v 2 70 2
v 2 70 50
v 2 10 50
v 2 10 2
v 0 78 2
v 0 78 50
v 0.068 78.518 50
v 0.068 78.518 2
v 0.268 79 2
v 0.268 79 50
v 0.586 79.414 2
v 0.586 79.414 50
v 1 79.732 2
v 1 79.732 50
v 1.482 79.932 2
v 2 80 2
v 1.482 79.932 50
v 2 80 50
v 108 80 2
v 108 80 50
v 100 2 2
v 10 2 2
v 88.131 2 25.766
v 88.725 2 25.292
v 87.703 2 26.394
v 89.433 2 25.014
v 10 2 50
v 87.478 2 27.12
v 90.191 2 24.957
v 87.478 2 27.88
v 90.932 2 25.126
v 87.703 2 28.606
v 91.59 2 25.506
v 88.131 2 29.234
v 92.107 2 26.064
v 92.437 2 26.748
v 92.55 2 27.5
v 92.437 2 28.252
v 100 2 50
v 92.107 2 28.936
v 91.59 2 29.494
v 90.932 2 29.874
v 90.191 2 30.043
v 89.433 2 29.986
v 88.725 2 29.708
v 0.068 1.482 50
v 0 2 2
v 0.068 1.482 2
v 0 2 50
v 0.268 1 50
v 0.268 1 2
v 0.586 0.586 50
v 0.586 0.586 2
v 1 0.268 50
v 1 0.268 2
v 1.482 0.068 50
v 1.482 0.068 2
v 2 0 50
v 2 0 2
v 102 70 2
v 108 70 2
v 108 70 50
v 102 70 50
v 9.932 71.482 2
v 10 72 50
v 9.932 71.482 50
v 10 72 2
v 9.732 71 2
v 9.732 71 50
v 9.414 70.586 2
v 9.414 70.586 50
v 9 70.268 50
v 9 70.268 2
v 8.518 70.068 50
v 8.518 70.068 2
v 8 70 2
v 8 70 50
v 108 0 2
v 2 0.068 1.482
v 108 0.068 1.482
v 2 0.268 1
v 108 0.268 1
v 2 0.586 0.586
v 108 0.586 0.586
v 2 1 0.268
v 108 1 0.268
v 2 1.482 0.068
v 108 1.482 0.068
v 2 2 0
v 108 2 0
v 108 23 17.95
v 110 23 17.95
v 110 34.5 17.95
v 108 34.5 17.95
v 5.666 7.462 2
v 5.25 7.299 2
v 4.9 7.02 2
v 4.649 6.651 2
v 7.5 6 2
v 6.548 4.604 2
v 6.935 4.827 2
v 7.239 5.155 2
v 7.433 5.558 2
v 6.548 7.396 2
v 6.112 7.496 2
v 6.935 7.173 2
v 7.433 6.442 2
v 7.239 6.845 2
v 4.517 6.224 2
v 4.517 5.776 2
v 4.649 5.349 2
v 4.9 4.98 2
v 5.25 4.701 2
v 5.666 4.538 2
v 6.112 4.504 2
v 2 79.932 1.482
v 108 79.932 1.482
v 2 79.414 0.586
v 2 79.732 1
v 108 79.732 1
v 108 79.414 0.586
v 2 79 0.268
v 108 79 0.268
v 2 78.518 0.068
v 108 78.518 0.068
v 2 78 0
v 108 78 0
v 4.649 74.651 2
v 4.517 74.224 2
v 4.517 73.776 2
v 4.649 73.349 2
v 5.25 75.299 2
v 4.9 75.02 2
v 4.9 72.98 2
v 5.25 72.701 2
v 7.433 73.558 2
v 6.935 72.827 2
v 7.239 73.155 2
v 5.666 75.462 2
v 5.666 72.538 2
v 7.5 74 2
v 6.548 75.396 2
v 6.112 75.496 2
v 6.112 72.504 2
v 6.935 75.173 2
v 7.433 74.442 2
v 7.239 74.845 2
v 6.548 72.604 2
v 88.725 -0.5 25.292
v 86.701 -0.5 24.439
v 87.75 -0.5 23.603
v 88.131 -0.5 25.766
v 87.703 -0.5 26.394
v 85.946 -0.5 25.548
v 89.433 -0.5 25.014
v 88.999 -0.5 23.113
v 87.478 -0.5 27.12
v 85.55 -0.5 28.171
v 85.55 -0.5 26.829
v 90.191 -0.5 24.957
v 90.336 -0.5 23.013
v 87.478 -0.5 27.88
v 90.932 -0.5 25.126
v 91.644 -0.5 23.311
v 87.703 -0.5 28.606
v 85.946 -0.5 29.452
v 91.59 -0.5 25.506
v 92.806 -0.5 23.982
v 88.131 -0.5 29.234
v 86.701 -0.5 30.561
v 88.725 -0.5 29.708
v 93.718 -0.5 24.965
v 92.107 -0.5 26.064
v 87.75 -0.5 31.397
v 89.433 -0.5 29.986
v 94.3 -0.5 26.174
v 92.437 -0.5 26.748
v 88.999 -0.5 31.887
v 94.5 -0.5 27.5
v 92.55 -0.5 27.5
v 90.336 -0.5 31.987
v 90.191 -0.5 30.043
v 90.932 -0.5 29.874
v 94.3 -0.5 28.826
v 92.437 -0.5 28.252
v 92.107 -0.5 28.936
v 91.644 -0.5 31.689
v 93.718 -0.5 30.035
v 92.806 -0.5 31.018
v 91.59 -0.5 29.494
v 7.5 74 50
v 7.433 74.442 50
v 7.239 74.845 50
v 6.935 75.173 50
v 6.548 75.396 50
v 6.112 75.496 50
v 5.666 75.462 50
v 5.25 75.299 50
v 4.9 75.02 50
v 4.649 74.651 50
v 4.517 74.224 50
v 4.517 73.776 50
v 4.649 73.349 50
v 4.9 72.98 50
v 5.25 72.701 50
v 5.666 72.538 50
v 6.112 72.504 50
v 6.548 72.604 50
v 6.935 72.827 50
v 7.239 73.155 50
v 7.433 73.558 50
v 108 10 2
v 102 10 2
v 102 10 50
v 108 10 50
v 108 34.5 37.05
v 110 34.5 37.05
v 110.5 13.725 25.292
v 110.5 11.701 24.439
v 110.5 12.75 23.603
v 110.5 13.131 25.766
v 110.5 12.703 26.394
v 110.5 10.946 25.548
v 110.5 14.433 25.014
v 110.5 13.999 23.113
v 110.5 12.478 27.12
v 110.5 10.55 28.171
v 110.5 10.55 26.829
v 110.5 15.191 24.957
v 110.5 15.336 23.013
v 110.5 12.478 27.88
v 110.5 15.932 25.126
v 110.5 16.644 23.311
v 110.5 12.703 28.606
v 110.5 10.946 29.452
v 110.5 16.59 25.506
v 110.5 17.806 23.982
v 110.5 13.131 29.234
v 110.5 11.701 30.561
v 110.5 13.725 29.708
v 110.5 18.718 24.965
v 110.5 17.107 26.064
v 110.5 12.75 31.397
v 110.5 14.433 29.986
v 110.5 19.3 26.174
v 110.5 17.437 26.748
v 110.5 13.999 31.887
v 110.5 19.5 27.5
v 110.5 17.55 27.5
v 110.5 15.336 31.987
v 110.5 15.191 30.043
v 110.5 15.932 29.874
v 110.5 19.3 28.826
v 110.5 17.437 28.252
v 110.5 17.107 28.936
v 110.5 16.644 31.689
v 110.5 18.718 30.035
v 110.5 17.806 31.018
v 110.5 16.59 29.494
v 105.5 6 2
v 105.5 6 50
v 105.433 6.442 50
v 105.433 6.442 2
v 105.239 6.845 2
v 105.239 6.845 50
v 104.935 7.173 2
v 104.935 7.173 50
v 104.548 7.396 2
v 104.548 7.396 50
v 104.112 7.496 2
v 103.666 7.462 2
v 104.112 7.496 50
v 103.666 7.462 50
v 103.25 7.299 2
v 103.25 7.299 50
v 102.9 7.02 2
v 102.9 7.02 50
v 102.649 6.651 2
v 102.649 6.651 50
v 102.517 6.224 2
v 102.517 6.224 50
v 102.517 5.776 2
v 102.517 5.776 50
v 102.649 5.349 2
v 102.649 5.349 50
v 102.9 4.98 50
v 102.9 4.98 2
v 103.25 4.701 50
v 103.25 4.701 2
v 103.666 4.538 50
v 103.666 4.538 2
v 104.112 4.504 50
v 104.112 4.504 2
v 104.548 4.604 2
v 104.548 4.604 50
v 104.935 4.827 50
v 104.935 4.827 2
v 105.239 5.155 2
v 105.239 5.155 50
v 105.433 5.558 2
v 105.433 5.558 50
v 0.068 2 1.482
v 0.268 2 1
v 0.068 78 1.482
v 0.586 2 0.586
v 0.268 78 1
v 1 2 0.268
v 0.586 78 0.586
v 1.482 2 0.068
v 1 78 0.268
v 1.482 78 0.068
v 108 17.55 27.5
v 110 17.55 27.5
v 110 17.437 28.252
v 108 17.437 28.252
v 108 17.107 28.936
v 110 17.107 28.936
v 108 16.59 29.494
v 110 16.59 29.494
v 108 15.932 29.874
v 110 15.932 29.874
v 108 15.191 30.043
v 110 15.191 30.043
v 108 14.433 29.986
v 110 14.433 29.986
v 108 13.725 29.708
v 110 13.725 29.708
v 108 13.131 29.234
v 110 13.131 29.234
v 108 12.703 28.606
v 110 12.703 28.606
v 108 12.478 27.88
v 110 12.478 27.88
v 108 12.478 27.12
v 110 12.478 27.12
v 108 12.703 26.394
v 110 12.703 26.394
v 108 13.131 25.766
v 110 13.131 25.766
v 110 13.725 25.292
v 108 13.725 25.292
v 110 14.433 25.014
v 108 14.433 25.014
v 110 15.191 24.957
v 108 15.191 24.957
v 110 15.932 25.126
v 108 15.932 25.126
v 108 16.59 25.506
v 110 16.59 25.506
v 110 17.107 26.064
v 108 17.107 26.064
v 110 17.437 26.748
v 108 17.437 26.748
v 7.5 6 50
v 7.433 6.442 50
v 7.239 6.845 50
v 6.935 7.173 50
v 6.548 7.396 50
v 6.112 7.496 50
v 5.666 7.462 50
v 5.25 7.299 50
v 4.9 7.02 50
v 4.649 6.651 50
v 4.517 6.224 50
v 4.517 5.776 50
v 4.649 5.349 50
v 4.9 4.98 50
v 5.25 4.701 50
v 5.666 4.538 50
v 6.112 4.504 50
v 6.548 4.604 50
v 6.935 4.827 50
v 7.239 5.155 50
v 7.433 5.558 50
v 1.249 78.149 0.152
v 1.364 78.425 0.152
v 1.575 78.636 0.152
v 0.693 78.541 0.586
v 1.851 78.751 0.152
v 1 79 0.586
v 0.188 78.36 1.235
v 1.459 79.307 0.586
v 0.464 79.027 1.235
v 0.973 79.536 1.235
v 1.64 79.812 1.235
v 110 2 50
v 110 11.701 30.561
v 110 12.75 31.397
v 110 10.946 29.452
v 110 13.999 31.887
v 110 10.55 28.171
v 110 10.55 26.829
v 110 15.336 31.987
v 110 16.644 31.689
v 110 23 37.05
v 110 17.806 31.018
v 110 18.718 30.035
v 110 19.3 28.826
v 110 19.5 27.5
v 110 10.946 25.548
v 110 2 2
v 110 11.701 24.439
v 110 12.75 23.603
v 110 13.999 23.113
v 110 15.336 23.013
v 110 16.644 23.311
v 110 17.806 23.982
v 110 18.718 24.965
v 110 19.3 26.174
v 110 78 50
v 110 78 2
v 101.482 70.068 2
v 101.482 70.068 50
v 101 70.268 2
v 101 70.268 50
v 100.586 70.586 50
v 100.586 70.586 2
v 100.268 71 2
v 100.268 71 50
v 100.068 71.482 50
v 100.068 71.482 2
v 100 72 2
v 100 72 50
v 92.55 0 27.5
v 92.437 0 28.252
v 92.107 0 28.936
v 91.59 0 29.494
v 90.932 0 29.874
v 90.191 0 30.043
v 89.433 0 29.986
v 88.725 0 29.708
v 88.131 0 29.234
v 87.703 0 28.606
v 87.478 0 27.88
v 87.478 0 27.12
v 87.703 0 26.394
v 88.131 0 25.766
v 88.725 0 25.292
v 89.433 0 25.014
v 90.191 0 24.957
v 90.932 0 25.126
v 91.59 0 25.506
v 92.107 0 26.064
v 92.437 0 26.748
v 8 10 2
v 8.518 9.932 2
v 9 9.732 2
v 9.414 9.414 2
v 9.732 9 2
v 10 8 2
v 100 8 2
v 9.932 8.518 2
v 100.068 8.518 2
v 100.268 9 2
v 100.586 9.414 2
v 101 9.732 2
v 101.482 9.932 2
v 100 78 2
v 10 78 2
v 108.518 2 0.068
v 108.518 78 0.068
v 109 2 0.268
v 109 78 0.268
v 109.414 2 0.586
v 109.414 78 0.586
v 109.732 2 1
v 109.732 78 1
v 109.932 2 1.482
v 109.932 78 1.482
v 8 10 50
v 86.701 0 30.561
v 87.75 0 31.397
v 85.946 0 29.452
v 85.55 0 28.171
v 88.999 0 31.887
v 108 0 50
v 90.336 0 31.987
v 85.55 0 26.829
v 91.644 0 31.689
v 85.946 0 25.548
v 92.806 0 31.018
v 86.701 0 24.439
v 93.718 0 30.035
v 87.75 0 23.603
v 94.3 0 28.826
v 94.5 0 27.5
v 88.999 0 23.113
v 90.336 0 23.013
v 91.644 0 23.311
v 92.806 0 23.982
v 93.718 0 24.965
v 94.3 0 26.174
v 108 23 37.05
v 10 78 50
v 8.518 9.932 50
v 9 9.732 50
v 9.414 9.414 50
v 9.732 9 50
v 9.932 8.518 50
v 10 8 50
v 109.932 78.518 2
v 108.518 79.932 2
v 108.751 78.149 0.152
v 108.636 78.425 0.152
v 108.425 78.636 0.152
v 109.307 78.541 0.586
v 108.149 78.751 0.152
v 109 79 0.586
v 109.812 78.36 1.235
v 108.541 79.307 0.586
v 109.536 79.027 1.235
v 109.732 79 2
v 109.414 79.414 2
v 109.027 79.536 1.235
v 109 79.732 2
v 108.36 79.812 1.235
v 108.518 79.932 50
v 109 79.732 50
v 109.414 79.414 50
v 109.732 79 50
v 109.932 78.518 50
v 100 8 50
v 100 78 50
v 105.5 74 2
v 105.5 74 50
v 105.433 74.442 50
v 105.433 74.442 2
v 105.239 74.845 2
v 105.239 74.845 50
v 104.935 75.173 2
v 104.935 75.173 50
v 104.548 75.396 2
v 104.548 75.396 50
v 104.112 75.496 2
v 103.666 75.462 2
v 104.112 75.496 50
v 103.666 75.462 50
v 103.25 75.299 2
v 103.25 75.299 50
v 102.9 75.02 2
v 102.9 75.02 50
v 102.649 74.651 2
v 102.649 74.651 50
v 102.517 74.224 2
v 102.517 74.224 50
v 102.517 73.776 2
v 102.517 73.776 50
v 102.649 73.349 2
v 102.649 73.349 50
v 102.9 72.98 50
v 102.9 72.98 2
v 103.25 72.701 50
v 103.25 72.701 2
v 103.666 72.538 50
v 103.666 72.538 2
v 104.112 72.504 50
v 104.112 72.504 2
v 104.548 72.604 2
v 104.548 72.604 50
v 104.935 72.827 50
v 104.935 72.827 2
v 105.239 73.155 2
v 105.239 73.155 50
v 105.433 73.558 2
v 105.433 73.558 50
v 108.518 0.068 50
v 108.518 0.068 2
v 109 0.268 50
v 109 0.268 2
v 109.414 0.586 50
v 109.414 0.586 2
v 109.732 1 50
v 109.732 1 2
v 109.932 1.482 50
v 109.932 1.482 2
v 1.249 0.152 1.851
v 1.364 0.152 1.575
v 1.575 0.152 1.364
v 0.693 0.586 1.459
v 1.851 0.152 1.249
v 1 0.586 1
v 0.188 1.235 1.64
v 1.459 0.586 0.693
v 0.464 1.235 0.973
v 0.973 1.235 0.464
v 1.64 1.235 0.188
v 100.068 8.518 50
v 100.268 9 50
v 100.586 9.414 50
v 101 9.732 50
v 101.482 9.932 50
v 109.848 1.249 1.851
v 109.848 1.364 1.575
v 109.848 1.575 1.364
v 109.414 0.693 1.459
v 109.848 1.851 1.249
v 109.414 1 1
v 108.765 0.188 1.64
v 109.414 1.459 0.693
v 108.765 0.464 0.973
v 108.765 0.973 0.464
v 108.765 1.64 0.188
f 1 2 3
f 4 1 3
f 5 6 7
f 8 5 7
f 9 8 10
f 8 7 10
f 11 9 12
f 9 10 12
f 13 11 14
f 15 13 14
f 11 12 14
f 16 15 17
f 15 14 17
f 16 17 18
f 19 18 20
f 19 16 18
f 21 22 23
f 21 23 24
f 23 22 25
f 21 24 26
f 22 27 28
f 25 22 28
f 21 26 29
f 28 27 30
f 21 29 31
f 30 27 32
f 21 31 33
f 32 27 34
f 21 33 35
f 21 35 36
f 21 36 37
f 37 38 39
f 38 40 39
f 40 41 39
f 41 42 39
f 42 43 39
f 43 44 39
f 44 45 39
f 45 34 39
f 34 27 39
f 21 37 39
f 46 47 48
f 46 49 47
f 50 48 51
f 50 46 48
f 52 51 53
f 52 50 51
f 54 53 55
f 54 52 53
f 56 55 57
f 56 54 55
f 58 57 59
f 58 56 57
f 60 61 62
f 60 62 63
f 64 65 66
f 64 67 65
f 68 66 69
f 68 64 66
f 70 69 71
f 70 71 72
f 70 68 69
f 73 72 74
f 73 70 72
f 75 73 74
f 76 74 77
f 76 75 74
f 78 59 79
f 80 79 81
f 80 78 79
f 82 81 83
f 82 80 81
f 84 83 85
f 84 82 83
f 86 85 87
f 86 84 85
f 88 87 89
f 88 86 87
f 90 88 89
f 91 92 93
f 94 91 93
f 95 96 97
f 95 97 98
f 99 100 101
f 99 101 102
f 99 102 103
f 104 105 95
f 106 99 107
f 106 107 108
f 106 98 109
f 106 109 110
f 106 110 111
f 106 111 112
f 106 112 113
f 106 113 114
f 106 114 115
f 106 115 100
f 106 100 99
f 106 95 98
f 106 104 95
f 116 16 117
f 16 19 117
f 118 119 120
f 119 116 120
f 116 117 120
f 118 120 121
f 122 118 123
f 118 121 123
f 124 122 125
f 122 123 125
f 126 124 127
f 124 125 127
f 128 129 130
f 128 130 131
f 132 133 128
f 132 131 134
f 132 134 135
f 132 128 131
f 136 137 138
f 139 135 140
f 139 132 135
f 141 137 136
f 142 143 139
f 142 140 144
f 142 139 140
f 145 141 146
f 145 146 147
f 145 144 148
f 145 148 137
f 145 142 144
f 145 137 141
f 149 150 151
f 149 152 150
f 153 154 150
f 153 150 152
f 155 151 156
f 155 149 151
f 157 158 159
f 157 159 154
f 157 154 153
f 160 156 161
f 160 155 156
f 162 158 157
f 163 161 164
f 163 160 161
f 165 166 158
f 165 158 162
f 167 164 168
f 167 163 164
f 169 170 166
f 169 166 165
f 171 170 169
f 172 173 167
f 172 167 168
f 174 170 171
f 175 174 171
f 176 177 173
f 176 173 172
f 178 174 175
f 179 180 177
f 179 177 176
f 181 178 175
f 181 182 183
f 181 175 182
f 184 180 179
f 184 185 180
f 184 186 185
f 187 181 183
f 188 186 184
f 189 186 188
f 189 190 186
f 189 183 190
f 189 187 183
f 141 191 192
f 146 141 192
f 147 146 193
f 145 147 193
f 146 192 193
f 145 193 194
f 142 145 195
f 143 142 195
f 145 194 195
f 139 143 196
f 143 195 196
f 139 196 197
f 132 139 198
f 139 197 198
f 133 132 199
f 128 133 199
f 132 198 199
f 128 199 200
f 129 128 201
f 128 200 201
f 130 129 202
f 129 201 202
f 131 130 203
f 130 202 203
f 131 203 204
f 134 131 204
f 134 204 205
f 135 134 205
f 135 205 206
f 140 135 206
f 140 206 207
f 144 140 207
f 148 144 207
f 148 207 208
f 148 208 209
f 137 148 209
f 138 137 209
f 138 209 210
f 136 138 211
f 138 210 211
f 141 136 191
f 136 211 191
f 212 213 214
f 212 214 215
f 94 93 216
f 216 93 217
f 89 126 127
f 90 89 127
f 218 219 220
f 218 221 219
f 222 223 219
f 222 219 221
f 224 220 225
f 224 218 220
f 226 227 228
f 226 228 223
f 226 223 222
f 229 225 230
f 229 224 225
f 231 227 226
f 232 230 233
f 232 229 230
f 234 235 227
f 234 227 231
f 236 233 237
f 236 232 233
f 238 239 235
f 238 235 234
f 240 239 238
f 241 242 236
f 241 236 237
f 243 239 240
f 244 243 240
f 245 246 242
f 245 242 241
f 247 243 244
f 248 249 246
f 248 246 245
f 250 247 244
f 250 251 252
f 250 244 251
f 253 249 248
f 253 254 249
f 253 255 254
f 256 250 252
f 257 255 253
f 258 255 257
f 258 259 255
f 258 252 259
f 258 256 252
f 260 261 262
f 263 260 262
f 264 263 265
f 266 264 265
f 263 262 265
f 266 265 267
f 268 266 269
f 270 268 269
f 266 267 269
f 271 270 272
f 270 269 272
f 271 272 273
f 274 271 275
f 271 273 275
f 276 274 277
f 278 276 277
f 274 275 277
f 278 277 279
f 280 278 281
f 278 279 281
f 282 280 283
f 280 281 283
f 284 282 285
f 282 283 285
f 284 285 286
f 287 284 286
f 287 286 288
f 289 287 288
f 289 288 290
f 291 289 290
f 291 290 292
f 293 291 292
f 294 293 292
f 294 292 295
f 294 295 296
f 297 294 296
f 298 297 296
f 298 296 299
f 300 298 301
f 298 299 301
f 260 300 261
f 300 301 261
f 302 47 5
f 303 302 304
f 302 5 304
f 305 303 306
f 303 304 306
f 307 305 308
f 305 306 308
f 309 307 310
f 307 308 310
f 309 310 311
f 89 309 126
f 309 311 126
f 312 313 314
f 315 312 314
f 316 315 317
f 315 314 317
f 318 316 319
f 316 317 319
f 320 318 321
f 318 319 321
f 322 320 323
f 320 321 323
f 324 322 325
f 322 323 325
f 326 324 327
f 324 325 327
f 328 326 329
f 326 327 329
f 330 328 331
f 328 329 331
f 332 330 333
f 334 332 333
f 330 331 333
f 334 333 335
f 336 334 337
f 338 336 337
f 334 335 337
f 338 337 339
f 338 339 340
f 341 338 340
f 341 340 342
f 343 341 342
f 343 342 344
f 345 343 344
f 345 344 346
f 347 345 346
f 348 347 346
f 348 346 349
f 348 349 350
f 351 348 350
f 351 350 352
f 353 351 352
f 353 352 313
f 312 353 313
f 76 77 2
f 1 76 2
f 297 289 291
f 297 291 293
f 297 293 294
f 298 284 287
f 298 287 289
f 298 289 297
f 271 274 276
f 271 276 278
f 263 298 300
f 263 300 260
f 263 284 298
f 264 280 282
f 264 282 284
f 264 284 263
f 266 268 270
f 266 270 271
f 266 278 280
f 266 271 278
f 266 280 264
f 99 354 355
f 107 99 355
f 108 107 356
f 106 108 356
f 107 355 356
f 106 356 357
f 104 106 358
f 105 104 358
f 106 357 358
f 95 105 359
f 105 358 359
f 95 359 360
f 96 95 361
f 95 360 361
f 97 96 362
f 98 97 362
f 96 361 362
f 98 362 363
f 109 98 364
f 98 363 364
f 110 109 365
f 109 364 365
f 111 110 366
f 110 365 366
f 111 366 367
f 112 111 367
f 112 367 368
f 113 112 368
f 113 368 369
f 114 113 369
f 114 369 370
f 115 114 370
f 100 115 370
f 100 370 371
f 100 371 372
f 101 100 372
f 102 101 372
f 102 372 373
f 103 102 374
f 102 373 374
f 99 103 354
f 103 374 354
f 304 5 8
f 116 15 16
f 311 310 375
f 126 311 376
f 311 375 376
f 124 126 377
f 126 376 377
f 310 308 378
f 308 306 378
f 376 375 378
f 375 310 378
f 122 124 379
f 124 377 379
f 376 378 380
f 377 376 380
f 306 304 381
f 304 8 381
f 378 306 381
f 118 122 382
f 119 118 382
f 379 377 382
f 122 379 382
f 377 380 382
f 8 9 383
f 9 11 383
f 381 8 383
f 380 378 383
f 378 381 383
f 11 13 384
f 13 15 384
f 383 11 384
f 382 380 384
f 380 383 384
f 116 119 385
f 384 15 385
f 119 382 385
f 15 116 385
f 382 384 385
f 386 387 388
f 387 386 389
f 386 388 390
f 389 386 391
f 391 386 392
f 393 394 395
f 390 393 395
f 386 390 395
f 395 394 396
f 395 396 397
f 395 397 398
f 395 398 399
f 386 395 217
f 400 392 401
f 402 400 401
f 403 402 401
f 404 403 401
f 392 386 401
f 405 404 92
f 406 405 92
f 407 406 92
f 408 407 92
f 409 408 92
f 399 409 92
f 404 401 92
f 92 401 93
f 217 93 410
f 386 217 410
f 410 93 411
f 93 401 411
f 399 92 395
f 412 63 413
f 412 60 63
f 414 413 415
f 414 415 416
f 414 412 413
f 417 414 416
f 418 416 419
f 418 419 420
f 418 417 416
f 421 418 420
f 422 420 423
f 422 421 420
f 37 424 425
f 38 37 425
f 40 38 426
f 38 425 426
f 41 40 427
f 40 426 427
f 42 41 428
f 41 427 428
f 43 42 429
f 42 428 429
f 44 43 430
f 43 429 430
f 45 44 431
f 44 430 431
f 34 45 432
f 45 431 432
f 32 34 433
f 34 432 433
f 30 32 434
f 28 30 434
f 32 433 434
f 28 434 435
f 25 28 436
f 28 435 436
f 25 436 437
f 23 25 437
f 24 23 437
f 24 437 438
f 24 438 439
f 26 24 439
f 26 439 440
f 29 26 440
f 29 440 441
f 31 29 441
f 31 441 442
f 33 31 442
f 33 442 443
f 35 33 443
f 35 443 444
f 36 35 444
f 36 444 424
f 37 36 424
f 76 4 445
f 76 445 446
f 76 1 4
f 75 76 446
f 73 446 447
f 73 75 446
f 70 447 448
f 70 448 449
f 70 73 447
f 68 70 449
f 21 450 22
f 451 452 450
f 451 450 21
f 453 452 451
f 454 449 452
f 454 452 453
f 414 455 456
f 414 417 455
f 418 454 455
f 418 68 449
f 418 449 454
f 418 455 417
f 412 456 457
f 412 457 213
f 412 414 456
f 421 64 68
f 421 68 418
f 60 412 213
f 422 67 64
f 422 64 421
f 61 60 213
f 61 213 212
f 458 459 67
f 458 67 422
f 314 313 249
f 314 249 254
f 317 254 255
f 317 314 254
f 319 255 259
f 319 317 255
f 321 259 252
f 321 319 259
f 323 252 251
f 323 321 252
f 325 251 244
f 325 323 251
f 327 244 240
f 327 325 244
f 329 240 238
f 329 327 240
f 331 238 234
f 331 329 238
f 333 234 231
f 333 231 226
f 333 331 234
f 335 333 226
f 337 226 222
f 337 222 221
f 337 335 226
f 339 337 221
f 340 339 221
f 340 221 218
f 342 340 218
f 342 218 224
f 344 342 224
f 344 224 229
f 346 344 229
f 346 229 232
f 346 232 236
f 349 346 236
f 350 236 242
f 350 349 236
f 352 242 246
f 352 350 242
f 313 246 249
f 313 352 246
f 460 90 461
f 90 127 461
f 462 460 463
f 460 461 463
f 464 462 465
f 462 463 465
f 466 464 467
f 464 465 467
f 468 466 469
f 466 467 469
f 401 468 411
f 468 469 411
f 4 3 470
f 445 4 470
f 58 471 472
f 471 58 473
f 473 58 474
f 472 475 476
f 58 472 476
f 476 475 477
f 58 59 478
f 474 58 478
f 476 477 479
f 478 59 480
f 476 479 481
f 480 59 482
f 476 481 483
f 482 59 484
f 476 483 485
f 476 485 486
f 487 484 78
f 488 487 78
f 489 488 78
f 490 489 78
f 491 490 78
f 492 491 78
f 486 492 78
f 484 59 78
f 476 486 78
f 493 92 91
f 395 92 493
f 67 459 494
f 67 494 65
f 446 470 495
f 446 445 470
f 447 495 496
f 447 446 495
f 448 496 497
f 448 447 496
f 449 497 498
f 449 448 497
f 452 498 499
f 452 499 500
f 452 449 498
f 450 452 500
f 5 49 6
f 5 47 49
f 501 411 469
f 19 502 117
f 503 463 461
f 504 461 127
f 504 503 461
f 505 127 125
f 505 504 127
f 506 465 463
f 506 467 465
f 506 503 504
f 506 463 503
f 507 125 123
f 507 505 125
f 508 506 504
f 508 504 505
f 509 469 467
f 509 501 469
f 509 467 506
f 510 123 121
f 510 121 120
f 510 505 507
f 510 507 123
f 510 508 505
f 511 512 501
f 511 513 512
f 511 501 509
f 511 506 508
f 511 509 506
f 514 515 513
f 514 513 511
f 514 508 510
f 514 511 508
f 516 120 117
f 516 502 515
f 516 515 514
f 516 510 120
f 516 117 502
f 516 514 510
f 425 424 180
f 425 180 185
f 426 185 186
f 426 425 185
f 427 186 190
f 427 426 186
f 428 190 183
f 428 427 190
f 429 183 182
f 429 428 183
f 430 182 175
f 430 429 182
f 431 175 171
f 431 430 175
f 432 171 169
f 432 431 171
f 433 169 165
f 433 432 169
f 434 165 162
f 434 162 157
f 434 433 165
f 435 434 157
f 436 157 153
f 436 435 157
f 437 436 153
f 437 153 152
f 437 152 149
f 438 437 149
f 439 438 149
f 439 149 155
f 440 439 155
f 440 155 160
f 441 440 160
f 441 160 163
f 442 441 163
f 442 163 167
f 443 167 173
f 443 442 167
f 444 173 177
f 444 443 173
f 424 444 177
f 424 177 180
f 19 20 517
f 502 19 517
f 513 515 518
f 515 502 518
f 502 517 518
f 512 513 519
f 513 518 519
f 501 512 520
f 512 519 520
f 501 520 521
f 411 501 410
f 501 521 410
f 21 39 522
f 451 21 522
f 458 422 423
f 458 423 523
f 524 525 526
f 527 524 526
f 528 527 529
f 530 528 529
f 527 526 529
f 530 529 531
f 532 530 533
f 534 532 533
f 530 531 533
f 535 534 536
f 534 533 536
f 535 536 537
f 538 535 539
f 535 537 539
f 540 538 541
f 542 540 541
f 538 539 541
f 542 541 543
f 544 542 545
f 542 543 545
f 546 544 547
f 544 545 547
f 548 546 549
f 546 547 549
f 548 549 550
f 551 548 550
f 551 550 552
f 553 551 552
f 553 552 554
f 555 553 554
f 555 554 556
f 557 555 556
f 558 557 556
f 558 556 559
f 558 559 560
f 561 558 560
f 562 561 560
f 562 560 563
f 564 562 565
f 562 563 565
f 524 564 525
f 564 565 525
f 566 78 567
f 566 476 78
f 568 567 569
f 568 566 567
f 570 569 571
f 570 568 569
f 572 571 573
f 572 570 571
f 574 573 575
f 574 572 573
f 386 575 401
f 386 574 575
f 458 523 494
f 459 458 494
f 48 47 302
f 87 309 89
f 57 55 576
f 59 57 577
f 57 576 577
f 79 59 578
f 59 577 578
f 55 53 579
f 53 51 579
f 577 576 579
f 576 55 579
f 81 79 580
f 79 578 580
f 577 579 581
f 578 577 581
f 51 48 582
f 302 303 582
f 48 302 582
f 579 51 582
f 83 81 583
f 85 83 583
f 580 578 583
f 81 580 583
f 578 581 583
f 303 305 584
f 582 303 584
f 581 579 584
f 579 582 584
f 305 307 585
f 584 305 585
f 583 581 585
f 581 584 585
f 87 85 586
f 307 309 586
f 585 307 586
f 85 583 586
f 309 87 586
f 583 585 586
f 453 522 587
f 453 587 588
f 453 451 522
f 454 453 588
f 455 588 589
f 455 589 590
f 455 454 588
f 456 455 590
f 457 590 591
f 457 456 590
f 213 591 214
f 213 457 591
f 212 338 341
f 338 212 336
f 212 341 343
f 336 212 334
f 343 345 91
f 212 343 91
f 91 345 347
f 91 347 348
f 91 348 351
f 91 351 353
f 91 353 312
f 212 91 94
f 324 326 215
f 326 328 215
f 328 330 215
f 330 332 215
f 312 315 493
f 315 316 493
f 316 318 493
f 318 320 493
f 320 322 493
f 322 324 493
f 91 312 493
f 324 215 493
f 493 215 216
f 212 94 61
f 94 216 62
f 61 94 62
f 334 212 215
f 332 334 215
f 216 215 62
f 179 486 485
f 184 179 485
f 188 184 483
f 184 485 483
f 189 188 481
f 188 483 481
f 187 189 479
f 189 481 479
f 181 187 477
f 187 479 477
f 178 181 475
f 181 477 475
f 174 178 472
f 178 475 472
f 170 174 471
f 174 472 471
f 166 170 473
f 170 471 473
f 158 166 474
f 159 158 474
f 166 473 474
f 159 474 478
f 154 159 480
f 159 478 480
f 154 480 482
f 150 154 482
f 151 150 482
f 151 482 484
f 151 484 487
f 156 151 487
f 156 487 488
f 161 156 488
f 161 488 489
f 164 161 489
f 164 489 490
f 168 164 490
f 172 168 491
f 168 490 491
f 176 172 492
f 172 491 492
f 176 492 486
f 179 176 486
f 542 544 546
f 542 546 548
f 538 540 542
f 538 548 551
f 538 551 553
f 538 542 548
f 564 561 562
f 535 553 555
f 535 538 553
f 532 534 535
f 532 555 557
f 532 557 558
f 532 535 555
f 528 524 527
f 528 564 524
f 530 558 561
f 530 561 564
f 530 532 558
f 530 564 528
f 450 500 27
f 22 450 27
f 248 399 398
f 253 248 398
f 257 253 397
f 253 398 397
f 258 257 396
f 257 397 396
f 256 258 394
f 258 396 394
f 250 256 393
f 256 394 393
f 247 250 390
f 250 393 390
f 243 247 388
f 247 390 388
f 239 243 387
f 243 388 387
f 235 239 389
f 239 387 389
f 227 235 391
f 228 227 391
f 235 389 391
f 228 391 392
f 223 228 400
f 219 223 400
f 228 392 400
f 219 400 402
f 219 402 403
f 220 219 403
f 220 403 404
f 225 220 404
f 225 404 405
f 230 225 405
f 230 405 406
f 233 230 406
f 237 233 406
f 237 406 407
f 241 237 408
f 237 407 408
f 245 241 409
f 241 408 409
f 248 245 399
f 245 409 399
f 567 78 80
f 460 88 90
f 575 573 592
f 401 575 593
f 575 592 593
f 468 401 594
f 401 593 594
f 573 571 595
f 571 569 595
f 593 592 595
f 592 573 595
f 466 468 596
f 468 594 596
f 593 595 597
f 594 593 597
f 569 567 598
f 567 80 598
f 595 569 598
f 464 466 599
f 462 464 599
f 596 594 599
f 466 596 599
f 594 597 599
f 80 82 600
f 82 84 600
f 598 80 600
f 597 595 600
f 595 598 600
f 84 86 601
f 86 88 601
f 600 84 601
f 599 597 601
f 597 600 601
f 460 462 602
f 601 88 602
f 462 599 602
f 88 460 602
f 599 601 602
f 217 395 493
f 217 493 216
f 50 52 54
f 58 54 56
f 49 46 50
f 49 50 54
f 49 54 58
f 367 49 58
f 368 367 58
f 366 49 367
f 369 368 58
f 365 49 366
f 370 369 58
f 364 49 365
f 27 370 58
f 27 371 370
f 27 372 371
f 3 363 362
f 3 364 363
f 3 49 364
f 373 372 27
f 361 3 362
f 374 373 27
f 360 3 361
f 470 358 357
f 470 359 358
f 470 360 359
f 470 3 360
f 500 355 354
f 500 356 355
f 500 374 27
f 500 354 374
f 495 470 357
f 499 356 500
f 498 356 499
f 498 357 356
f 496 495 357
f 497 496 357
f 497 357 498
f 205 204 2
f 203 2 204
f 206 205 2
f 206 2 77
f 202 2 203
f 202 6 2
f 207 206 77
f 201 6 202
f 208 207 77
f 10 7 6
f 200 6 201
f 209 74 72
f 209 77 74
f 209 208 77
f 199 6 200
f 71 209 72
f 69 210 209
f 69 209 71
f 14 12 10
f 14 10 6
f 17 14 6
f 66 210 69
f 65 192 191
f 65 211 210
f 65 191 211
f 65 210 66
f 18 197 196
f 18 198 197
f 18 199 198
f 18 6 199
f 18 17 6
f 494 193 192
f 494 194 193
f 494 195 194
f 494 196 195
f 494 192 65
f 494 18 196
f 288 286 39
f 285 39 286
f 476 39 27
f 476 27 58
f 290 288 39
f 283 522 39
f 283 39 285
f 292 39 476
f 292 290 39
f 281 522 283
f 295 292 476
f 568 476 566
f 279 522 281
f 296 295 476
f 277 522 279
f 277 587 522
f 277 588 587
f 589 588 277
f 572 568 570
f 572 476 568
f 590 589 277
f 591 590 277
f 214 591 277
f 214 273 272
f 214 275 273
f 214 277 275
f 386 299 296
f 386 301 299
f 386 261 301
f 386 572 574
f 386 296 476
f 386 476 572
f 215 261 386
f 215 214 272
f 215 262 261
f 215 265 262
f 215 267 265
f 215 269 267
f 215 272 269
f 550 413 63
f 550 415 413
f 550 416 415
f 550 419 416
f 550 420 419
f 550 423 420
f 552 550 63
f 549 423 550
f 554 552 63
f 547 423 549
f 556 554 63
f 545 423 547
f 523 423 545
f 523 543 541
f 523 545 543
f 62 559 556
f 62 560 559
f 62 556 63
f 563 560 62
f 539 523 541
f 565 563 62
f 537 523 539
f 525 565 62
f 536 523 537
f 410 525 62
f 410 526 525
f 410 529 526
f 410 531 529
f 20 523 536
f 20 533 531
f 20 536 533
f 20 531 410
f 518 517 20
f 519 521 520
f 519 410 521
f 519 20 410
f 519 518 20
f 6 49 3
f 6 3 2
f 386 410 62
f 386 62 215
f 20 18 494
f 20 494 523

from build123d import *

# Parameters (mm, degrees)
SKETCH_W        = 110
SKETCH_H        = 80
PAD_DEPTH       = 50
SKETCH001_R     = 1.5
POCKET_DEPTH    = 48
FILLET_R        = 2
FILLET001_R     = 2
SKETCH002_R     = 2.55
SKETCH002_W     = 11.5
SKETCH002_H     = 19.1
POCKET001_DEPTH = 5
SKETCH003_R     = 2.55
POCKET002_DEPTH = 5
SKETCH004_R     = 4.5
SKETCH004_R_2   = 2.55
PAD001_DEPTH    = 0.5
SKETCH005_R     = 4.5
SKETCH005_R_2   = 2.55
PAD002_DEPTH    = 0.5


with BuildPart() as part:
    # Sketch → Pad (new body)
    with BuildSketch(Plane.XY):
        with Locations((55, 40)):
            Rectangle(SKETCH_W, SKETCH_H)
    extrude(amount=PAD_DEPTH)

    # Sketch001 (on Face6 of Pad) → Pocket (cut)
    with BuildSketch(Plane.XY.offset(50)):
        with Locations((6, 74)):
            Circle(SKETCH001_R)
        with Locations((104, 74)):
            Circle(SKETCH001_R)
        with Locations((104, 6)):
            Circle(SKETCH001_R)
        with Locations((6, 6)):
            Circle(SKETCH001_R)
        Polygon((2, 10), (10, 10), (10, 2), (100, 2), (100, 10), (108, 10), (108, 70), (100, 70), (100, 78), (10, 78), (10, 70), (2, 70), align=None)
    extrude(amount=-POCKET_DEPTH, mode=Mode.SUBTRACT)

    # Fillet
    fillet_edges = [part.edges().sort_by_distance(p)[0] for p in [
        (0, 80, 25),
        (0, 40, 0),
        (0, 0, 25),
        (55, 0, 0),
        (110, 0, 25),
        (110, 80, 25),
        (110, 40, 0),
        (55, 80, 0),
    ]]
    fillet(fillet_edges, radius=FILLET_R)

    # Fillet001
    fillet001_edges = [part.edges().sort_by_distance(p)[0] for p in [
        (100, 10, 26),
        (100, 70, 26),
        (10, 70, 26),
        (10, 10, 26),
    ]]
    fillet(fillet001_edges, radius=FILLET001_R)

    # Sketch002 (on Face22 of Fillet001) → Pocket001 (cut)
    with BuildSketch(Plane.YZ.offset(110)):
        with Locations((15, 27.5)):
            Circle(SKETCH002_R)
        with Locations((28.75, 27.5)):
            Rectangle(SKETCH002_W, SKETCH002_H)
    extrude(amount=-POCKET001_DEPTH, mode=Mode.SUBTRACT)

    # Sketch003 (on Face18 of Pocket001) → Pocket002 (cut)
    with BuildSketch(Plane.XZ):
        with Locations((90, 27.5)):
            Circle(SKETCH003_R)
    extrude(amount=-POCKET002_DEPTH, mode=Mode.SUBTRACT)

    # Sketch004 (on Face22 of Pocket002) → Pad001 (join)
    with BuildSketch(Plane.YZ.offset(110)):
        with Locations((15, 27.5)):
            Circle(SKETCH004_R)
        with Locations((15, 27.5)):
            Circle(SKETCH004_R_2, mode=Mode.SUBTRACT)
    extrude(amount=PAD001_DEPTH)

    # Sketch005 (on Face18 of Pad001) → Pad002 (join)
    with BuildSketch(Plane.XZ):
        with Locations((90, 27.5)):
            Circle(SKETCH005_R)
        with Locations((90, 27.5)):
            Circle(SKETCH005_R_2, mode=Mode.SUBTRACT)
    extrude(amount=PAD002_DEPTH)


solid = part.part
